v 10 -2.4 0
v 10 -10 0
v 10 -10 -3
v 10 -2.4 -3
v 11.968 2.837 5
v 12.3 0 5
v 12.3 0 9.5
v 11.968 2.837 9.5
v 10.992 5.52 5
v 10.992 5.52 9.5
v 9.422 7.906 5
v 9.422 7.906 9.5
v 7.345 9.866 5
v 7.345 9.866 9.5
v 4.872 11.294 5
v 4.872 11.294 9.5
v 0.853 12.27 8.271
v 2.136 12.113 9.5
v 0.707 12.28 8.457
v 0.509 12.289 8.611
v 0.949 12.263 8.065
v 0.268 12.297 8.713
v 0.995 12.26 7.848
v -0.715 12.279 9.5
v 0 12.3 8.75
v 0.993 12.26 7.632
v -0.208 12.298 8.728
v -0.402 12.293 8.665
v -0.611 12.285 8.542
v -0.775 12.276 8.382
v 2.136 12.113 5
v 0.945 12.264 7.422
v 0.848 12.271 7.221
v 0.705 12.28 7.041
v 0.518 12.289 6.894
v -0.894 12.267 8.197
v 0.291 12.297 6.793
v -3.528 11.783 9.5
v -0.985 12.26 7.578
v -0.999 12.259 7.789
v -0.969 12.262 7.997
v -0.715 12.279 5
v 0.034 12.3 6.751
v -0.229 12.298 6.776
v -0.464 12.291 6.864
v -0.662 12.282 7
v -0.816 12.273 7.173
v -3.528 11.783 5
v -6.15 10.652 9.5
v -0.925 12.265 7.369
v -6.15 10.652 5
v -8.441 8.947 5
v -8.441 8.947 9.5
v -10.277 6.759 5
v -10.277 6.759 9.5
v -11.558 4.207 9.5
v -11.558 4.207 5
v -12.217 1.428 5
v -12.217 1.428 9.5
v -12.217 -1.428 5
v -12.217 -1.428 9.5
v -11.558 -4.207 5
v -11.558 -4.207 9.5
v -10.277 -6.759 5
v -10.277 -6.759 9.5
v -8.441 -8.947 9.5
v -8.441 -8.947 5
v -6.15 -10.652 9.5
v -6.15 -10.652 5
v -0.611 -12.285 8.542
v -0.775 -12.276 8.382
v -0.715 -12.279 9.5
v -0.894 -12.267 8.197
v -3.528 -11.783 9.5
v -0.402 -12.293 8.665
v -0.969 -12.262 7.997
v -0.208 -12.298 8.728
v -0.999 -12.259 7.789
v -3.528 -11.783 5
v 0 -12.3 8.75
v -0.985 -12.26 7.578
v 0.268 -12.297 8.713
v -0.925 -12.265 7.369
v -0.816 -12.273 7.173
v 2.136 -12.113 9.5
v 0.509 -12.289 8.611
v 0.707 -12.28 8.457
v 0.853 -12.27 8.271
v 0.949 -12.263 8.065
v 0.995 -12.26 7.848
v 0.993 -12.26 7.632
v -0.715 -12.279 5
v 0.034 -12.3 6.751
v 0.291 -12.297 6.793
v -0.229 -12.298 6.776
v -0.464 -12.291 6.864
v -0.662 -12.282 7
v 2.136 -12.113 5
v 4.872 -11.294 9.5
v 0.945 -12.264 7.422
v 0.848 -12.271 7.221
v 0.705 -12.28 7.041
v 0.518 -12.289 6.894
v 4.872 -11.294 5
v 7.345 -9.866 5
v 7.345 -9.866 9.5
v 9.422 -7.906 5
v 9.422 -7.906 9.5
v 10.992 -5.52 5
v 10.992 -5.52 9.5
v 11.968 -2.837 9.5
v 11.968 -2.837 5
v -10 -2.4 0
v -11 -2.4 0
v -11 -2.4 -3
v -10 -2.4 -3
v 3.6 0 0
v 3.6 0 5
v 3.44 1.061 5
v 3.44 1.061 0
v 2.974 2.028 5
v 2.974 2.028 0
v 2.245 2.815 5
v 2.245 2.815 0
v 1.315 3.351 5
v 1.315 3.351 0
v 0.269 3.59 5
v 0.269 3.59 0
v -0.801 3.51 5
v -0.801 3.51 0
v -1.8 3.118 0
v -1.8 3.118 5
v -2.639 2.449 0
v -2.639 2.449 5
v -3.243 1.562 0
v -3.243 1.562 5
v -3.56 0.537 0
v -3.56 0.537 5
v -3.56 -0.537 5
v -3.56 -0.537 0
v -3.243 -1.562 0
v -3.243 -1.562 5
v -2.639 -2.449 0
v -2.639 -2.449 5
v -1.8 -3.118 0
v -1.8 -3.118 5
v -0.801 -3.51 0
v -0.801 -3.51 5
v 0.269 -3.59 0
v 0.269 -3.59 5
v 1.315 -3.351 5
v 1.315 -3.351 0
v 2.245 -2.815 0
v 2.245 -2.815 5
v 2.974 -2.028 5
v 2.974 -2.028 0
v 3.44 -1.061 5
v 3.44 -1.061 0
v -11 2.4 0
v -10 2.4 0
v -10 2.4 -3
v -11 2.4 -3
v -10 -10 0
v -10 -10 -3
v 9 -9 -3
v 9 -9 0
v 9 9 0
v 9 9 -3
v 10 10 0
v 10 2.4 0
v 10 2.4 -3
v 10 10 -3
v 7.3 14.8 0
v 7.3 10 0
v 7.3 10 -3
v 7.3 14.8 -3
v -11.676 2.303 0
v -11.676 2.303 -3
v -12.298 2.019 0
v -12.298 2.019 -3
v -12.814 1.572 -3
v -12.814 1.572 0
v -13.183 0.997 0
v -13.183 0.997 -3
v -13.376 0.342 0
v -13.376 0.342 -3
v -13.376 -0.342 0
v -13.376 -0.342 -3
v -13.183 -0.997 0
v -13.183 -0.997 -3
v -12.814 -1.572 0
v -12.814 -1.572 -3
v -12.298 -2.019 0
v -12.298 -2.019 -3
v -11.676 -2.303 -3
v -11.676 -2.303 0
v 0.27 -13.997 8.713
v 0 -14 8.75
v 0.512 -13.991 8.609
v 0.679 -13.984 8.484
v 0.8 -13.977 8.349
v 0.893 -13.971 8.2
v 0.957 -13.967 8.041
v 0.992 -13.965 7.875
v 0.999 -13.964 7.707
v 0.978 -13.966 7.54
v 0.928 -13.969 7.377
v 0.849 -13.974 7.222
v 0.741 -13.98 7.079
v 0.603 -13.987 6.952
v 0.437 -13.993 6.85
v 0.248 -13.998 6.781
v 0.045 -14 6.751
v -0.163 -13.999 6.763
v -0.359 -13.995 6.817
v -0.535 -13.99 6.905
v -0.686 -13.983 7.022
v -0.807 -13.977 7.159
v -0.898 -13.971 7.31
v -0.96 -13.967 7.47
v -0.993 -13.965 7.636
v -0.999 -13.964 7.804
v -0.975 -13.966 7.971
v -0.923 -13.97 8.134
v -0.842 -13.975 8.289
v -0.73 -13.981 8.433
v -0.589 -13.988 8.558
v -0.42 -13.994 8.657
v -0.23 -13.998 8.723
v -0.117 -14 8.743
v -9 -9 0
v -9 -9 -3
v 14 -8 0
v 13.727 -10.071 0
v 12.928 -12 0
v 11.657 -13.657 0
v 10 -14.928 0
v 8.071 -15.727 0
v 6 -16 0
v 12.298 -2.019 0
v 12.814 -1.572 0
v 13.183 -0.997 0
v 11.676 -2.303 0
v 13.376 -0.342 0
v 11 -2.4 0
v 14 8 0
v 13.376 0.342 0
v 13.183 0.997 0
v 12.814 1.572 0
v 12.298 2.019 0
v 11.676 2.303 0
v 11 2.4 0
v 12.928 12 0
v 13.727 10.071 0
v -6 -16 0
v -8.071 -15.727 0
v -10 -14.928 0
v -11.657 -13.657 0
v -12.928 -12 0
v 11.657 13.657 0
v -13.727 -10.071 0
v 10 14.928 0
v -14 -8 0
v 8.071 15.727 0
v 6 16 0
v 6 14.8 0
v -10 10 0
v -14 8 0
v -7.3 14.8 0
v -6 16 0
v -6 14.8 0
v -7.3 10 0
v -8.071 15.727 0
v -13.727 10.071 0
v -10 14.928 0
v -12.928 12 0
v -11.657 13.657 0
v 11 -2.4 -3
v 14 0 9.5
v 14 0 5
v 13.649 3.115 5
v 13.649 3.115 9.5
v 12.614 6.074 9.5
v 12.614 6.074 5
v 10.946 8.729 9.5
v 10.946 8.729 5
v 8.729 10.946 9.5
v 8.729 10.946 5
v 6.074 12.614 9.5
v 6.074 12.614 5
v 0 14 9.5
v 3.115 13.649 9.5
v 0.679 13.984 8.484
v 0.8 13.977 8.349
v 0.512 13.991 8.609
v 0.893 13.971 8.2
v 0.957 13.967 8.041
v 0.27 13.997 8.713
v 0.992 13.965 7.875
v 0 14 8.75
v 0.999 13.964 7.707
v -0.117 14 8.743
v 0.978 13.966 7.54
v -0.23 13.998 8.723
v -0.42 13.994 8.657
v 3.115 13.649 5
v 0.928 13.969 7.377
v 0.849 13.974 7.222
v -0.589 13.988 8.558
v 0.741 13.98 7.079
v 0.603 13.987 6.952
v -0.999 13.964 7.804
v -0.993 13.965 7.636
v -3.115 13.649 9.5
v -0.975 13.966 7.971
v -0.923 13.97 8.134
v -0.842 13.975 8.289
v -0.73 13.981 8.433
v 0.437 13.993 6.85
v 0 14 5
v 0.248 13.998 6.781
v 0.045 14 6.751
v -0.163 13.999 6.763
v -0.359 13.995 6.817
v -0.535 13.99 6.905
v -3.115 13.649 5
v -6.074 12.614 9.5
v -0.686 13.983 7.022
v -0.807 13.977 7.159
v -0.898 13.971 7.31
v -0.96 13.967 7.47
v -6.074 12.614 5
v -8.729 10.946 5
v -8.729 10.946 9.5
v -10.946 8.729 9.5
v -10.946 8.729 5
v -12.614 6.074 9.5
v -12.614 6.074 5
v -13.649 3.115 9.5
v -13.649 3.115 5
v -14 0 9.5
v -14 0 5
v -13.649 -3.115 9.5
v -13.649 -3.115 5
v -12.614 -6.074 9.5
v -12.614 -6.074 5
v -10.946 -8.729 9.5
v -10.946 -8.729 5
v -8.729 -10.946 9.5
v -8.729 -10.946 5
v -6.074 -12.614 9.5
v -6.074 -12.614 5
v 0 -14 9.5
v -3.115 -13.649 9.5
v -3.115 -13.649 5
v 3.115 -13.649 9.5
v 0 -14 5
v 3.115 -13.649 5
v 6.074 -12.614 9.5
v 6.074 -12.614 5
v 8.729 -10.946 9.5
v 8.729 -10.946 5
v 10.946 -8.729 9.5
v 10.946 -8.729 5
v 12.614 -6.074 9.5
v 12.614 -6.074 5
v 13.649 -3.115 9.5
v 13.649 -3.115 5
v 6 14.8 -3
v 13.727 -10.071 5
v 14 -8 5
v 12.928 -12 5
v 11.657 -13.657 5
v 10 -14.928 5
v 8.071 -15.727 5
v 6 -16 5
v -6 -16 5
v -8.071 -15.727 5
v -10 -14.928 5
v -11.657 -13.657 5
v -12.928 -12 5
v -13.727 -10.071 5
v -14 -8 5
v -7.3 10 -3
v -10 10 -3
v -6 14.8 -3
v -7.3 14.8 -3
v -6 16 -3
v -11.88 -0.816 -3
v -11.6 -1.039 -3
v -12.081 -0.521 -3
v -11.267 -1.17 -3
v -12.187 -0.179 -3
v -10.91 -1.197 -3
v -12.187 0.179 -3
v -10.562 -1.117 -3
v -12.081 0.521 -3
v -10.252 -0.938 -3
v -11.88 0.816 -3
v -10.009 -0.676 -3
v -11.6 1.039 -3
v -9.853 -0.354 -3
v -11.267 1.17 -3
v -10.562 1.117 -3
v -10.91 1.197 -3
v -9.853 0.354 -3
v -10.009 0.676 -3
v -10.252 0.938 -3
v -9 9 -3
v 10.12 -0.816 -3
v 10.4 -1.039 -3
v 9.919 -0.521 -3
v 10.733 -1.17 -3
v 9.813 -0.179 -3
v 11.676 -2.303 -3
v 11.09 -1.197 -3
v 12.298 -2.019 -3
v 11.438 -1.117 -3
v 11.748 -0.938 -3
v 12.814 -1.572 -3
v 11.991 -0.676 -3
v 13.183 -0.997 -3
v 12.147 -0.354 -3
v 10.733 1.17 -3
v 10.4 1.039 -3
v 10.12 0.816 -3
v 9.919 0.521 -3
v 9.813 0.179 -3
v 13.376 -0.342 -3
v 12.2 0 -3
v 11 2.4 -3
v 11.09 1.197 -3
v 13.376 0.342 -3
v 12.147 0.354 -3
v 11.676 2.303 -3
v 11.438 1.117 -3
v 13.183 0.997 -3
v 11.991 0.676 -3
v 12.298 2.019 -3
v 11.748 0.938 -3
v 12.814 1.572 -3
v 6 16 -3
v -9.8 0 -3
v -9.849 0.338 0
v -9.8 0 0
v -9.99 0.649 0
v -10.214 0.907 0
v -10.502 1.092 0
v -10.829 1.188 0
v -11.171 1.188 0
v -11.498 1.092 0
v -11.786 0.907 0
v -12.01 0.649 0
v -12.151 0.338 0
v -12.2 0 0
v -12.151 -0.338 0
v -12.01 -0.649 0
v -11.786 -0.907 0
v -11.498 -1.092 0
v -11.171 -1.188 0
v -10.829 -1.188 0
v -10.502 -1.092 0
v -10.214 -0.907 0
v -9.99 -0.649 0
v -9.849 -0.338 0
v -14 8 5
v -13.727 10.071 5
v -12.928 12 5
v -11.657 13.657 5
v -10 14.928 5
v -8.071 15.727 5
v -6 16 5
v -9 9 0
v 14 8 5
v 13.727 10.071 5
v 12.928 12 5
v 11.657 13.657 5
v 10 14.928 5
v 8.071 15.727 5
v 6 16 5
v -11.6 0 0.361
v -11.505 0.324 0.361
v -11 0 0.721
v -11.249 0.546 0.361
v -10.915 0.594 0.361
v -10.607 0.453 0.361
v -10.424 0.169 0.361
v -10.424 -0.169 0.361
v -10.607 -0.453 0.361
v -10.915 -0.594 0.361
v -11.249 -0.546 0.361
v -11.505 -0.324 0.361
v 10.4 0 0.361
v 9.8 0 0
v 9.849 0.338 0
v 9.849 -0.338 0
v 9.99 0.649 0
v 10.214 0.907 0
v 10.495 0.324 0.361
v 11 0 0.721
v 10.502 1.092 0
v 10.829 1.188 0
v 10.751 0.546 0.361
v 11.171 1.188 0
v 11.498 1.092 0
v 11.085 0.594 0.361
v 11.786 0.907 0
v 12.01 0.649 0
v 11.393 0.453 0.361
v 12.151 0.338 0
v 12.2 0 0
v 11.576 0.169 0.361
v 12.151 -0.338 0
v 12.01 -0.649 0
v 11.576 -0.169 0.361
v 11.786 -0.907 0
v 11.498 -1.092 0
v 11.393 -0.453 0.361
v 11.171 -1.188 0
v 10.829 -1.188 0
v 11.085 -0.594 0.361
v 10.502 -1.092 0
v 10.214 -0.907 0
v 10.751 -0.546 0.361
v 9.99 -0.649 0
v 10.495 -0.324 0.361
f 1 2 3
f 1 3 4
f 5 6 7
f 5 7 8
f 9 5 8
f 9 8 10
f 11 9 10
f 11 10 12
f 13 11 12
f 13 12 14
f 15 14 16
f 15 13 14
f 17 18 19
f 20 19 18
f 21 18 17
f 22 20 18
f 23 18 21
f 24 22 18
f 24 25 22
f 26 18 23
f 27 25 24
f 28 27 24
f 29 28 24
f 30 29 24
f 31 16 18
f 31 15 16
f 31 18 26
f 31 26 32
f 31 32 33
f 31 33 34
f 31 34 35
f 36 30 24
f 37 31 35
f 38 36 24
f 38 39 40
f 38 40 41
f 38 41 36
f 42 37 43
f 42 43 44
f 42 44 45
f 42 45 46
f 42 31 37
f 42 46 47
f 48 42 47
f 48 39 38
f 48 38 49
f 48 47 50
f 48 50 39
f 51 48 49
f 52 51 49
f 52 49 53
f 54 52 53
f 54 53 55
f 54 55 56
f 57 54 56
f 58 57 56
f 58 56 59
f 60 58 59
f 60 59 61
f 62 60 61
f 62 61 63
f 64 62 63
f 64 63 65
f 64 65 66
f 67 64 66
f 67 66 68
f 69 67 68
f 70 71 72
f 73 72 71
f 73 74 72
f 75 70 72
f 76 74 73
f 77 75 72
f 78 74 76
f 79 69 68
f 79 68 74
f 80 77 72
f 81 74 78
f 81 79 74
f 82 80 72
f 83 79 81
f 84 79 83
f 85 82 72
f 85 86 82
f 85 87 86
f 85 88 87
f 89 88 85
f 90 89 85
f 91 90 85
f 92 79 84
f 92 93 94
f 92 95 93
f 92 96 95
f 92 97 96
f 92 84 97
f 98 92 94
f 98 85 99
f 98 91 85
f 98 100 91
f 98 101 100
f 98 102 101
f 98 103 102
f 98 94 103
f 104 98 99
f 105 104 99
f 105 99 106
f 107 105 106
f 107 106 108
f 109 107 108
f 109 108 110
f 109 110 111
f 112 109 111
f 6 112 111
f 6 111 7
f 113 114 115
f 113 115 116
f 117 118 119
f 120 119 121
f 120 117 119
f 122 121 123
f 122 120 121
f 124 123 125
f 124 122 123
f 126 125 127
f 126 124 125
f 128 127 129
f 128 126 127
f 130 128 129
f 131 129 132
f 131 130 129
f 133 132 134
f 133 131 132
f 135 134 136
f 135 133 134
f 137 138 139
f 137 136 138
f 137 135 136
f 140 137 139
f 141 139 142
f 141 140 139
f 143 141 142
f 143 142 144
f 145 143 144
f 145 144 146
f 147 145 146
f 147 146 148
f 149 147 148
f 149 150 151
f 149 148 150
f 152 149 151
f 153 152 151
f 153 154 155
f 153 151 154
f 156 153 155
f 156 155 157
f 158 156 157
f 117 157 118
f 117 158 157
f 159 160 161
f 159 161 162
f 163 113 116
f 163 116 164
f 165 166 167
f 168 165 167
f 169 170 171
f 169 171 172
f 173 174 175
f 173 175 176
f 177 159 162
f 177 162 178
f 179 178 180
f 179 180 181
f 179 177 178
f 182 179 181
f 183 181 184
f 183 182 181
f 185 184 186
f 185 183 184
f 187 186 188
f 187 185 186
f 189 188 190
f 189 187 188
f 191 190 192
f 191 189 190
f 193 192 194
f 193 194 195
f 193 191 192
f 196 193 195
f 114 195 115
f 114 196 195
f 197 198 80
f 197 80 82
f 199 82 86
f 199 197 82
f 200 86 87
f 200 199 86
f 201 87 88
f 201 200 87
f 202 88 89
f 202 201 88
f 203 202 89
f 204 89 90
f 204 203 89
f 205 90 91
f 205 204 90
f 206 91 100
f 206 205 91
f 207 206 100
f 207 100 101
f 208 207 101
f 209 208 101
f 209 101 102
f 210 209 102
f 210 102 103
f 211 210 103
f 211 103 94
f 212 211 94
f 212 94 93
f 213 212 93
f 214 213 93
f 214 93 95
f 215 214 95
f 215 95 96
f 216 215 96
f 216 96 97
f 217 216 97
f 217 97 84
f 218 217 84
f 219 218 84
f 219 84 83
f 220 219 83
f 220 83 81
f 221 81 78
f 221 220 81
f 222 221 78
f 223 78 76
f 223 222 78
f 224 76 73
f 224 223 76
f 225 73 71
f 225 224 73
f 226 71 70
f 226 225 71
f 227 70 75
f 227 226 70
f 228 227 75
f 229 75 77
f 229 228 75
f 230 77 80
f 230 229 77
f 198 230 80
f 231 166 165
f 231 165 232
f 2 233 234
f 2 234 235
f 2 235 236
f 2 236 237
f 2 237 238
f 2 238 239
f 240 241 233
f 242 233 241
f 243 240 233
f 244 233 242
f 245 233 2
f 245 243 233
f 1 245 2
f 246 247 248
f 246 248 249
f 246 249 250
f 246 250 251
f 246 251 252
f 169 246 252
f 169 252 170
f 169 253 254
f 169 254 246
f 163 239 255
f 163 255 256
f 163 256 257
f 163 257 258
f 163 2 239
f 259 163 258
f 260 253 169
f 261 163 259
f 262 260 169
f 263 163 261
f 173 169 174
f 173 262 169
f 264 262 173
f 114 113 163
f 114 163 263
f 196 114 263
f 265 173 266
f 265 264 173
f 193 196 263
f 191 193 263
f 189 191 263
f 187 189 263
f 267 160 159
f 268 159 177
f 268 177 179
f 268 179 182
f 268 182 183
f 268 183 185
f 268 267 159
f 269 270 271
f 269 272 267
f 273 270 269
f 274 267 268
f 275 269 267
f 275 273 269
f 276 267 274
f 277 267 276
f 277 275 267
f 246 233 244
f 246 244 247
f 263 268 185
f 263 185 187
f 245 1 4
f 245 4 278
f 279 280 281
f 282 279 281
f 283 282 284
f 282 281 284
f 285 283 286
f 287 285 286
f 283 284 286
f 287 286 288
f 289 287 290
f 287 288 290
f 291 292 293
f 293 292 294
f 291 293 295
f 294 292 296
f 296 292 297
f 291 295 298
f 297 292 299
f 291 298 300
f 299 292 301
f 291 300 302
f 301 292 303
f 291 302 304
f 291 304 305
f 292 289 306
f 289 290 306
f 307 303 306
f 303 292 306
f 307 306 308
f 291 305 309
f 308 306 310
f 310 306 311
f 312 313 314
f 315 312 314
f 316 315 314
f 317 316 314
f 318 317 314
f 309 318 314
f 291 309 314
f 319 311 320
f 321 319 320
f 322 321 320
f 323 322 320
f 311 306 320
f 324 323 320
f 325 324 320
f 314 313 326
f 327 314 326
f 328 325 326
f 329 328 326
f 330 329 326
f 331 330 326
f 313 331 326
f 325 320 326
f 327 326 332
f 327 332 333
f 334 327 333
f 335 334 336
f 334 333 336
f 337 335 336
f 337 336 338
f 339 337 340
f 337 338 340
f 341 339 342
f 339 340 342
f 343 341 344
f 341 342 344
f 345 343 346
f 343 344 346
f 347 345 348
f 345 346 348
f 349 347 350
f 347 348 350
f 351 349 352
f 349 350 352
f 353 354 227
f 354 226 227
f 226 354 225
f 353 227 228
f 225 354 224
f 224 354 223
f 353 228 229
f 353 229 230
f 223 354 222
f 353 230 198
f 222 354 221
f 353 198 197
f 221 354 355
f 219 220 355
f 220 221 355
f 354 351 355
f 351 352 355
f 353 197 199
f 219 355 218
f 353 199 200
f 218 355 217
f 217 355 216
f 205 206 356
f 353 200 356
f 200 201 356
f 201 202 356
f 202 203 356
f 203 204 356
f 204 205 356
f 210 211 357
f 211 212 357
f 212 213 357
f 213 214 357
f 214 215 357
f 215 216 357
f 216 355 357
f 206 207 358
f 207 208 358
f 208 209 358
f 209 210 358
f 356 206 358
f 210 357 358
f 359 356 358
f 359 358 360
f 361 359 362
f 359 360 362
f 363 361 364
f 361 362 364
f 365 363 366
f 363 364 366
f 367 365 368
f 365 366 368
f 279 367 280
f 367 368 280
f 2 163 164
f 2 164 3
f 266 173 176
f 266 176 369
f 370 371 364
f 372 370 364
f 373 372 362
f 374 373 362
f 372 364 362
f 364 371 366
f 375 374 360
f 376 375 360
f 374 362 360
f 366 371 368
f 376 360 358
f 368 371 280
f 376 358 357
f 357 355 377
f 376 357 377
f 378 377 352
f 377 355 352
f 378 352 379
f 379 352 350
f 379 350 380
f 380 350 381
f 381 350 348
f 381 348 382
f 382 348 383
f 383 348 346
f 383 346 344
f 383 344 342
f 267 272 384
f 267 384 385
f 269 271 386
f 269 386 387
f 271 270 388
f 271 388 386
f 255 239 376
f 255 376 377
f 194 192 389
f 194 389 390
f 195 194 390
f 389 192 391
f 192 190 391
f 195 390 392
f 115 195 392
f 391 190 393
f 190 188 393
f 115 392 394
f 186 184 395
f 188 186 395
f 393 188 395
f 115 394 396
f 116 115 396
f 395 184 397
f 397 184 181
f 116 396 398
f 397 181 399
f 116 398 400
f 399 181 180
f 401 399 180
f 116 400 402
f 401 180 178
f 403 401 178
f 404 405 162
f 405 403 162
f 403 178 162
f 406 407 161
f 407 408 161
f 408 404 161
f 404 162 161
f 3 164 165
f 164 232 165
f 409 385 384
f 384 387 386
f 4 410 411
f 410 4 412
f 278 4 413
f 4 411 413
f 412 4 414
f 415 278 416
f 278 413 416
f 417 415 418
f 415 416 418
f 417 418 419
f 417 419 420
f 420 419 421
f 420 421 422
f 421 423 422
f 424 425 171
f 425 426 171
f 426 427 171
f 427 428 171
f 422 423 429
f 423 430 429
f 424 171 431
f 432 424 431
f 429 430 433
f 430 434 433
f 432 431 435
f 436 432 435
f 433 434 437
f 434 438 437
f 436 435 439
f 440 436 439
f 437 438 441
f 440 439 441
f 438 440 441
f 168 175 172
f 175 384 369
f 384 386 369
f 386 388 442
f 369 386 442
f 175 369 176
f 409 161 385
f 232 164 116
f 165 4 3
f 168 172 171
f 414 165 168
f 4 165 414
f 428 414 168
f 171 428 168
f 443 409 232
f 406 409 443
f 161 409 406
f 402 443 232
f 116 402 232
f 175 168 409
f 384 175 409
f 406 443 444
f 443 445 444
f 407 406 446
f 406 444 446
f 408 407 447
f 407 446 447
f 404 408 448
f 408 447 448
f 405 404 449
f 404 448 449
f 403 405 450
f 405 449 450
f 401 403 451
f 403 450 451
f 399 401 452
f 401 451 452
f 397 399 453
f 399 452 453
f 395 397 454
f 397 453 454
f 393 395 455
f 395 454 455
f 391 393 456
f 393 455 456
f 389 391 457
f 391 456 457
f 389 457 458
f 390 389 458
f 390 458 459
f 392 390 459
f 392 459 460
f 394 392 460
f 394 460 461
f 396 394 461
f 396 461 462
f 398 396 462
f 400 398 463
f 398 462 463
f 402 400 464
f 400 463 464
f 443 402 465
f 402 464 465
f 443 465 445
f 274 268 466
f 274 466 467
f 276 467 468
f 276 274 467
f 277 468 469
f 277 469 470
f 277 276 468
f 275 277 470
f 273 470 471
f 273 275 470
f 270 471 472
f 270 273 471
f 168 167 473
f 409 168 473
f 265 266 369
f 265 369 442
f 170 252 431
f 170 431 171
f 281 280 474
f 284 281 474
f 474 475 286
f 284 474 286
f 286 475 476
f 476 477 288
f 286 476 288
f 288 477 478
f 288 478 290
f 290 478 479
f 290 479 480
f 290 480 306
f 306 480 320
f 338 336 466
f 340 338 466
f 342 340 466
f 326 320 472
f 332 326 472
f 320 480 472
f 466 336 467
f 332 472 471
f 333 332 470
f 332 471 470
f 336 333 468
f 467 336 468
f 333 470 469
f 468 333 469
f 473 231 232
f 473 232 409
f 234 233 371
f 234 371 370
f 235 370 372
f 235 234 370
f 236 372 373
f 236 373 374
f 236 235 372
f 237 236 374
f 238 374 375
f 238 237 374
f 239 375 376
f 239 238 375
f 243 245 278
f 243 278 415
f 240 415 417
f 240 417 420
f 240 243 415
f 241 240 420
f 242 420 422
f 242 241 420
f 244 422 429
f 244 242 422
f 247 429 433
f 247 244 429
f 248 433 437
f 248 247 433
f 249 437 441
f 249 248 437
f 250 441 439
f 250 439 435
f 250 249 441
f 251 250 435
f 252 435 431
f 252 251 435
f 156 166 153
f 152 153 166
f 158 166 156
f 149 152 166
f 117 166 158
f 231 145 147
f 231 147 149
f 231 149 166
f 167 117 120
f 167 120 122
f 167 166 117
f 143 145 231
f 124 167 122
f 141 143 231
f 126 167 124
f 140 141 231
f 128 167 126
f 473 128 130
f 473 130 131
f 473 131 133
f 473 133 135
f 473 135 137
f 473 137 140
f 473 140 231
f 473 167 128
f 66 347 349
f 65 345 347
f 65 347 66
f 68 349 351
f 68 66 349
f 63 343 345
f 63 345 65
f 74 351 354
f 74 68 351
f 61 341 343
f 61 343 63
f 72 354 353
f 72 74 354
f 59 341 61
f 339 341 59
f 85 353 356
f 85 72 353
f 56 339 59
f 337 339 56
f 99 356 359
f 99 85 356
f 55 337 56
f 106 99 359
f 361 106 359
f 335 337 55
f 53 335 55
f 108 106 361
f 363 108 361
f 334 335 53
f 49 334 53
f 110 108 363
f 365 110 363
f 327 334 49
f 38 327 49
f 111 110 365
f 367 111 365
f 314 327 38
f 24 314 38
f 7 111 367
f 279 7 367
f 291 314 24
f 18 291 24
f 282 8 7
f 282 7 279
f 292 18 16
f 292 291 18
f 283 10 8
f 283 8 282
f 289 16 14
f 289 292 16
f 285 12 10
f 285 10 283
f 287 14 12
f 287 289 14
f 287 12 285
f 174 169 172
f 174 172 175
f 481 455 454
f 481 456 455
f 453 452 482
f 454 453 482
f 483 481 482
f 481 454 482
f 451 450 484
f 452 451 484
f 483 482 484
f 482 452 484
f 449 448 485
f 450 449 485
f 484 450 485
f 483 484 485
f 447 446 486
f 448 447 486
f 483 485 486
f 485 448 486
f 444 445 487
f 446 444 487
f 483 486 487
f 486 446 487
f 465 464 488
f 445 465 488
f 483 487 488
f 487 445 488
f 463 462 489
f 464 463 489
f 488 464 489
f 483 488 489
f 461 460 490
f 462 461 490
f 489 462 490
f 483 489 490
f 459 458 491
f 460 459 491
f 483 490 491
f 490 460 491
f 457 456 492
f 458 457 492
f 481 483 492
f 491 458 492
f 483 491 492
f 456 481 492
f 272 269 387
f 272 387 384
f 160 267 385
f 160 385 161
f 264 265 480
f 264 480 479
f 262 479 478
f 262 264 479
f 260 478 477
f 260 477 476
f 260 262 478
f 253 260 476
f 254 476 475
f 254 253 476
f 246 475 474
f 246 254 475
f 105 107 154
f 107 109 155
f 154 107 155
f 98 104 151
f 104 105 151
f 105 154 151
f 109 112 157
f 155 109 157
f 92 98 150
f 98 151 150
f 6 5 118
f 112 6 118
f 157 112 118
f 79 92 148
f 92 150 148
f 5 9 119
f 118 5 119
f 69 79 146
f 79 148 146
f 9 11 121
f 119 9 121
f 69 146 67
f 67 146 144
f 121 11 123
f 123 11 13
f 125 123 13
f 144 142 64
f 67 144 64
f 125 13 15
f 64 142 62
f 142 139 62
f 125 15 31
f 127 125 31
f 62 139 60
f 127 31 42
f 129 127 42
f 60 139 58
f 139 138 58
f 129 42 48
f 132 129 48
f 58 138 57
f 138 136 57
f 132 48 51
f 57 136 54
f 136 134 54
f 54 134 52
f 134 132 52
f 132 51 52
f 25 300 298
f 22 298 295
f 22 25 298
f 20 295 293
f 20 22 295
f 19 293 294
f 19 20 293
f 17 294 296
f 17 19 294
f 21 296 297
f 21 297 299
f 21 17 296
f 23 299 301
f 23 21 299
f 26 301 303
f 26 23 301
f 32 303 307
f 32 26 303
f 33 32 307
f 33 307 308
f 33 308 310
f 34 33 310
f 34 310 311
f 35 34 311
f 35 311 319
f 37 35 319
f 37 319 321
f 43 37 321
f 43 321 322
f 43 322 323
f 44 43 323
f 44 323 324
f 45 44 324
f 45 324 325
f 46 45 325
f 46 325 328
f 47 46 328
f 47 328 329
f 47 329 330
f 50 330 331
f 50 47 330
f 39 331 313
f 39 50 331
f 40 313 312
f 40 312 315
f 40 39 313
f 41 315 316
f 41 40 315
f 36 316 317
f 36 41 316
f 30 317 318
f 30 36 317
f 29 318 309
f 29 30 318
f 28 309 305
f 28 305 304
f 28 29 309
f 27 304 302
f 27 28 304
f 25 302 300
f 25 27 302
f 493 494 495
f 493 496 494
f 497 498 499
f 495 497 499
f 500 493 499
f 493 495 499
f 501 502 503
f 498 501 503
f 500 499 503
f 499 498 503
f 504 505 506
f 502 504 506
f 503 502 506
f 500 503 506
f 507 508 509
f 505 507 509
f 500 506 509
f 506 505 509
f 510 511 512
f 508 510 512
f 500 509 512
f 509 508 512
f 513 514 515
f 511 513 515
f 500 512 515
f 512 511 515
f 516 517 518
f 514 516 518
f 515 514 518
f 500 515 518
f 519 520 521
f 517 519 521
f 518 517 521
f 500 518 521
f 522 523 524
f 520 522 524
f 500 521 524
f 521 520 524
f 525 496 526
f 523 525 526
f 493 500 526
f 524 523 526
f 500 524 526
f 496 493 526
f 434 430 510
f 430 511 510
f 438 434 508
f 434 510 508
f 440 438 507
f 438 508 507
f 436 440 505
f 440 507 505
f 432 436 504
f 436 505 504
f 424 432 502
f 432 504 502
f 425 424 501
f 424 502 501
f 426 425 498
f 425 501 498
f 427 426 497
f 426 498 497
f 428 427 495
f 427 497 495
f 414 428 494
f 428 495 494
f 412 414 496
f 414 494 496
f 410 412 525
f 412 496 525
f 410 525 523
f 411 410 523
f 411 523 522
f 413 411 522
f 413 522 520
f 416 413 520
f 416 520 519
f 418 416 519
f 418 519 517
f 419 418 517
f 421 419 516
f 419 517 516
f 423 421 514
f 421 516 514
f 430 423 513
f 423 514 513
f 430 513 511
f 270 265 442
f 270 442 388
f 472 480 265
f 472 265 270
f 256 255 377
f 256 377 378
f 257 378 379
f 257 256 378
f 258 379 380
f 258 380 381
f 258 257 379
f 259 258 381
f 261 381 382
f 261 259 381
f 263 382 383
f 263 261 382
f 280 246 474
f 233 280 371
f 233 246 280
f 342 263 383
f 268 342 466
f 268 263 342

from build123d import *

# Parameters (mm, degrees)
EXTRUDE_1_DEPTH         = 5
SKETCH_2_R              = 14
SKETCH_2_R_2            = 12.3
EXTRUDE_2_DEPTH         = 4.5
SKETCH_3_W              = 18
SKETCH_3_H              = 18
EXTRUDE_3_DEPTH         = 3
SKETCH_4_R              = 3.6
CUT_EXTRUDE_2_DEPTH     = 24.286262044
HOLE_WIZARD_M2_1_D      = 2.4
HOLE_WIZARD_M2_1_DEPTH  = 3
HOLE_WIZARD_M2_1_TIP    = 0.721032743
CUT_EXTRUDE1_DEPTH      = 24.286262044
CUT_EXTRUDE1_DEPTH_BACK = 24.286262044
SKETCH1_R               = 1


with BuildPart() as part:
    # 스케치1 → 보스-돌출1 (new body)
    with BuildSketch(Plane.XY):
        with BuildLine():
            Line((-6, 16), (6, 16))
            ThreePointArc((6, 16), (11.656854249, 13.656854249), (14, 8))
            Line((14, 8), (14, -8))
            ThreePointArc((14, -8), (11.656854249, -13.656854249), (6, -16))
            Line((6, -16), (-6, -16))
            ThreePointArc((-6, -16), (-11.656854249, -13.656854249), (-14, -8))
            Line((-14, -8), (-14, 8))
            ThreePointArc((-14, 8), (-11.656854249, 13.656854249), (-6, 16))
        make_face()
    extrude(amount=EXTRUDE_1_DEPTH)

    # 스케치2 → 보스-돌출2 (add)
    with BuildSketch(Plane.XY.offset(5)):
        Circle(SKETCH_2_R)
        Circle(SKETCH_2_R_2, mode=Mode.SUBTRACT)
    extrude(amount=EXTRUDE_2_DEPTH)

    # 스케치3 → 보스-돌출3 (add)
    with BuildSketch(Plane(origin=(0, 0, 0), x_dir=(-1, 0, 0), z_dir=(0, 0, -1))):
        with BuildLine():
            Line((-10, 10), (-7.3, 10))
            Line((-7.3, 10), (-7.3, 14.8))
            Line((-7.3, 14.8), (-6, 14.8))
            Line((-6, 14.8), (-6, 16))
            Line((-6, 16), (6, 16))
            Line((6, 16), (6, 14.8))
            Line((6, 14.8), (7.3, 14.8))
            Line((7.3, 14.8), (7.3, 10))
            Line((7.3, 10), (10, 10))
            Line((10, 10), (10, 2.4))
            Line((10, 2.4), (11, 2.4))
            ThreePointArc((11, 2.4), (13.4, 0), (11, -2.4))
            Line((11, -2.4), (10, -2.4))
            Line((10, -2.4), (10, -10))
            Line((10, -10), (-10, -10))
            Line((-10, -10), (-10, -2.4))
            Line((-10, -2.4), (-11, -2.4))
            ThreePointArc((-11, -2.4), (-13.4, 0), (-11, 2.4))
            Line((-11, 2.4), (-10, 2.4))
            Line((-10, 2.4), (-10, 10))
        make_face()
        Rectangle(SKETCH_3_W, SKETCH_3_H, mode=Mode.SUBTRACT)
    extrude(amount=EXTRUDE_3_DEPTH)

    # 스케치4 → 컷-돌출2 (cut, through all)
    with BuildSketch(Plane.XY):
        Circle(SKETCH_4_R)
    extrude(amount=CUT_EXTRUDE_2_DEPTH, mode=Mode.SUBTRACT)

    # M2 여유 구멍1
    with Locations(Plane(origin=(-11, 0, -3), x_dir=(-1, 0, 0), z_dir=(0, 0, -1))):
        with Locations((0, 0), (-22, 0)):
            Hole(HOLE_WIZARD_M2_1_D / 2, depth=HOLE_WIZARD_M2_1_DEPTH)
            with Locations((0, 0, -(HOLE_WIZARD_M2_1_DEPTH + HOLE_WIZARD_M2_1_TIP / 2))):  # 118° drill point
                Cone(0, HOLE_WIZARD_M2_1_D / 2, HOLE_WIZARD_M2_1_TIP, mode=Mode.SUBTRACT)

    # Sketch1 → Cut-Extrude1 (cut, two sides: drawn at the far end of the back side and taken through both)
    with BuildSketch(Plane(origin=(0, 0, 0), x_dir=(1, 0, 0), z_dir=(0, 1, 0)).offset(-CUT_EXTRUDE1_DEPTH_BACK)):
        with Locations(Location((0, -7.75, 0), (0, 0, 270))):
            Circle(SKETCH1_R)
    extrude(amount=CUT_EXTRUDE1_DEPTH + CUT_EXTRUDE1_DEPTH_BACK, mode=Mode.SUBTRACT)


solid = part.part
